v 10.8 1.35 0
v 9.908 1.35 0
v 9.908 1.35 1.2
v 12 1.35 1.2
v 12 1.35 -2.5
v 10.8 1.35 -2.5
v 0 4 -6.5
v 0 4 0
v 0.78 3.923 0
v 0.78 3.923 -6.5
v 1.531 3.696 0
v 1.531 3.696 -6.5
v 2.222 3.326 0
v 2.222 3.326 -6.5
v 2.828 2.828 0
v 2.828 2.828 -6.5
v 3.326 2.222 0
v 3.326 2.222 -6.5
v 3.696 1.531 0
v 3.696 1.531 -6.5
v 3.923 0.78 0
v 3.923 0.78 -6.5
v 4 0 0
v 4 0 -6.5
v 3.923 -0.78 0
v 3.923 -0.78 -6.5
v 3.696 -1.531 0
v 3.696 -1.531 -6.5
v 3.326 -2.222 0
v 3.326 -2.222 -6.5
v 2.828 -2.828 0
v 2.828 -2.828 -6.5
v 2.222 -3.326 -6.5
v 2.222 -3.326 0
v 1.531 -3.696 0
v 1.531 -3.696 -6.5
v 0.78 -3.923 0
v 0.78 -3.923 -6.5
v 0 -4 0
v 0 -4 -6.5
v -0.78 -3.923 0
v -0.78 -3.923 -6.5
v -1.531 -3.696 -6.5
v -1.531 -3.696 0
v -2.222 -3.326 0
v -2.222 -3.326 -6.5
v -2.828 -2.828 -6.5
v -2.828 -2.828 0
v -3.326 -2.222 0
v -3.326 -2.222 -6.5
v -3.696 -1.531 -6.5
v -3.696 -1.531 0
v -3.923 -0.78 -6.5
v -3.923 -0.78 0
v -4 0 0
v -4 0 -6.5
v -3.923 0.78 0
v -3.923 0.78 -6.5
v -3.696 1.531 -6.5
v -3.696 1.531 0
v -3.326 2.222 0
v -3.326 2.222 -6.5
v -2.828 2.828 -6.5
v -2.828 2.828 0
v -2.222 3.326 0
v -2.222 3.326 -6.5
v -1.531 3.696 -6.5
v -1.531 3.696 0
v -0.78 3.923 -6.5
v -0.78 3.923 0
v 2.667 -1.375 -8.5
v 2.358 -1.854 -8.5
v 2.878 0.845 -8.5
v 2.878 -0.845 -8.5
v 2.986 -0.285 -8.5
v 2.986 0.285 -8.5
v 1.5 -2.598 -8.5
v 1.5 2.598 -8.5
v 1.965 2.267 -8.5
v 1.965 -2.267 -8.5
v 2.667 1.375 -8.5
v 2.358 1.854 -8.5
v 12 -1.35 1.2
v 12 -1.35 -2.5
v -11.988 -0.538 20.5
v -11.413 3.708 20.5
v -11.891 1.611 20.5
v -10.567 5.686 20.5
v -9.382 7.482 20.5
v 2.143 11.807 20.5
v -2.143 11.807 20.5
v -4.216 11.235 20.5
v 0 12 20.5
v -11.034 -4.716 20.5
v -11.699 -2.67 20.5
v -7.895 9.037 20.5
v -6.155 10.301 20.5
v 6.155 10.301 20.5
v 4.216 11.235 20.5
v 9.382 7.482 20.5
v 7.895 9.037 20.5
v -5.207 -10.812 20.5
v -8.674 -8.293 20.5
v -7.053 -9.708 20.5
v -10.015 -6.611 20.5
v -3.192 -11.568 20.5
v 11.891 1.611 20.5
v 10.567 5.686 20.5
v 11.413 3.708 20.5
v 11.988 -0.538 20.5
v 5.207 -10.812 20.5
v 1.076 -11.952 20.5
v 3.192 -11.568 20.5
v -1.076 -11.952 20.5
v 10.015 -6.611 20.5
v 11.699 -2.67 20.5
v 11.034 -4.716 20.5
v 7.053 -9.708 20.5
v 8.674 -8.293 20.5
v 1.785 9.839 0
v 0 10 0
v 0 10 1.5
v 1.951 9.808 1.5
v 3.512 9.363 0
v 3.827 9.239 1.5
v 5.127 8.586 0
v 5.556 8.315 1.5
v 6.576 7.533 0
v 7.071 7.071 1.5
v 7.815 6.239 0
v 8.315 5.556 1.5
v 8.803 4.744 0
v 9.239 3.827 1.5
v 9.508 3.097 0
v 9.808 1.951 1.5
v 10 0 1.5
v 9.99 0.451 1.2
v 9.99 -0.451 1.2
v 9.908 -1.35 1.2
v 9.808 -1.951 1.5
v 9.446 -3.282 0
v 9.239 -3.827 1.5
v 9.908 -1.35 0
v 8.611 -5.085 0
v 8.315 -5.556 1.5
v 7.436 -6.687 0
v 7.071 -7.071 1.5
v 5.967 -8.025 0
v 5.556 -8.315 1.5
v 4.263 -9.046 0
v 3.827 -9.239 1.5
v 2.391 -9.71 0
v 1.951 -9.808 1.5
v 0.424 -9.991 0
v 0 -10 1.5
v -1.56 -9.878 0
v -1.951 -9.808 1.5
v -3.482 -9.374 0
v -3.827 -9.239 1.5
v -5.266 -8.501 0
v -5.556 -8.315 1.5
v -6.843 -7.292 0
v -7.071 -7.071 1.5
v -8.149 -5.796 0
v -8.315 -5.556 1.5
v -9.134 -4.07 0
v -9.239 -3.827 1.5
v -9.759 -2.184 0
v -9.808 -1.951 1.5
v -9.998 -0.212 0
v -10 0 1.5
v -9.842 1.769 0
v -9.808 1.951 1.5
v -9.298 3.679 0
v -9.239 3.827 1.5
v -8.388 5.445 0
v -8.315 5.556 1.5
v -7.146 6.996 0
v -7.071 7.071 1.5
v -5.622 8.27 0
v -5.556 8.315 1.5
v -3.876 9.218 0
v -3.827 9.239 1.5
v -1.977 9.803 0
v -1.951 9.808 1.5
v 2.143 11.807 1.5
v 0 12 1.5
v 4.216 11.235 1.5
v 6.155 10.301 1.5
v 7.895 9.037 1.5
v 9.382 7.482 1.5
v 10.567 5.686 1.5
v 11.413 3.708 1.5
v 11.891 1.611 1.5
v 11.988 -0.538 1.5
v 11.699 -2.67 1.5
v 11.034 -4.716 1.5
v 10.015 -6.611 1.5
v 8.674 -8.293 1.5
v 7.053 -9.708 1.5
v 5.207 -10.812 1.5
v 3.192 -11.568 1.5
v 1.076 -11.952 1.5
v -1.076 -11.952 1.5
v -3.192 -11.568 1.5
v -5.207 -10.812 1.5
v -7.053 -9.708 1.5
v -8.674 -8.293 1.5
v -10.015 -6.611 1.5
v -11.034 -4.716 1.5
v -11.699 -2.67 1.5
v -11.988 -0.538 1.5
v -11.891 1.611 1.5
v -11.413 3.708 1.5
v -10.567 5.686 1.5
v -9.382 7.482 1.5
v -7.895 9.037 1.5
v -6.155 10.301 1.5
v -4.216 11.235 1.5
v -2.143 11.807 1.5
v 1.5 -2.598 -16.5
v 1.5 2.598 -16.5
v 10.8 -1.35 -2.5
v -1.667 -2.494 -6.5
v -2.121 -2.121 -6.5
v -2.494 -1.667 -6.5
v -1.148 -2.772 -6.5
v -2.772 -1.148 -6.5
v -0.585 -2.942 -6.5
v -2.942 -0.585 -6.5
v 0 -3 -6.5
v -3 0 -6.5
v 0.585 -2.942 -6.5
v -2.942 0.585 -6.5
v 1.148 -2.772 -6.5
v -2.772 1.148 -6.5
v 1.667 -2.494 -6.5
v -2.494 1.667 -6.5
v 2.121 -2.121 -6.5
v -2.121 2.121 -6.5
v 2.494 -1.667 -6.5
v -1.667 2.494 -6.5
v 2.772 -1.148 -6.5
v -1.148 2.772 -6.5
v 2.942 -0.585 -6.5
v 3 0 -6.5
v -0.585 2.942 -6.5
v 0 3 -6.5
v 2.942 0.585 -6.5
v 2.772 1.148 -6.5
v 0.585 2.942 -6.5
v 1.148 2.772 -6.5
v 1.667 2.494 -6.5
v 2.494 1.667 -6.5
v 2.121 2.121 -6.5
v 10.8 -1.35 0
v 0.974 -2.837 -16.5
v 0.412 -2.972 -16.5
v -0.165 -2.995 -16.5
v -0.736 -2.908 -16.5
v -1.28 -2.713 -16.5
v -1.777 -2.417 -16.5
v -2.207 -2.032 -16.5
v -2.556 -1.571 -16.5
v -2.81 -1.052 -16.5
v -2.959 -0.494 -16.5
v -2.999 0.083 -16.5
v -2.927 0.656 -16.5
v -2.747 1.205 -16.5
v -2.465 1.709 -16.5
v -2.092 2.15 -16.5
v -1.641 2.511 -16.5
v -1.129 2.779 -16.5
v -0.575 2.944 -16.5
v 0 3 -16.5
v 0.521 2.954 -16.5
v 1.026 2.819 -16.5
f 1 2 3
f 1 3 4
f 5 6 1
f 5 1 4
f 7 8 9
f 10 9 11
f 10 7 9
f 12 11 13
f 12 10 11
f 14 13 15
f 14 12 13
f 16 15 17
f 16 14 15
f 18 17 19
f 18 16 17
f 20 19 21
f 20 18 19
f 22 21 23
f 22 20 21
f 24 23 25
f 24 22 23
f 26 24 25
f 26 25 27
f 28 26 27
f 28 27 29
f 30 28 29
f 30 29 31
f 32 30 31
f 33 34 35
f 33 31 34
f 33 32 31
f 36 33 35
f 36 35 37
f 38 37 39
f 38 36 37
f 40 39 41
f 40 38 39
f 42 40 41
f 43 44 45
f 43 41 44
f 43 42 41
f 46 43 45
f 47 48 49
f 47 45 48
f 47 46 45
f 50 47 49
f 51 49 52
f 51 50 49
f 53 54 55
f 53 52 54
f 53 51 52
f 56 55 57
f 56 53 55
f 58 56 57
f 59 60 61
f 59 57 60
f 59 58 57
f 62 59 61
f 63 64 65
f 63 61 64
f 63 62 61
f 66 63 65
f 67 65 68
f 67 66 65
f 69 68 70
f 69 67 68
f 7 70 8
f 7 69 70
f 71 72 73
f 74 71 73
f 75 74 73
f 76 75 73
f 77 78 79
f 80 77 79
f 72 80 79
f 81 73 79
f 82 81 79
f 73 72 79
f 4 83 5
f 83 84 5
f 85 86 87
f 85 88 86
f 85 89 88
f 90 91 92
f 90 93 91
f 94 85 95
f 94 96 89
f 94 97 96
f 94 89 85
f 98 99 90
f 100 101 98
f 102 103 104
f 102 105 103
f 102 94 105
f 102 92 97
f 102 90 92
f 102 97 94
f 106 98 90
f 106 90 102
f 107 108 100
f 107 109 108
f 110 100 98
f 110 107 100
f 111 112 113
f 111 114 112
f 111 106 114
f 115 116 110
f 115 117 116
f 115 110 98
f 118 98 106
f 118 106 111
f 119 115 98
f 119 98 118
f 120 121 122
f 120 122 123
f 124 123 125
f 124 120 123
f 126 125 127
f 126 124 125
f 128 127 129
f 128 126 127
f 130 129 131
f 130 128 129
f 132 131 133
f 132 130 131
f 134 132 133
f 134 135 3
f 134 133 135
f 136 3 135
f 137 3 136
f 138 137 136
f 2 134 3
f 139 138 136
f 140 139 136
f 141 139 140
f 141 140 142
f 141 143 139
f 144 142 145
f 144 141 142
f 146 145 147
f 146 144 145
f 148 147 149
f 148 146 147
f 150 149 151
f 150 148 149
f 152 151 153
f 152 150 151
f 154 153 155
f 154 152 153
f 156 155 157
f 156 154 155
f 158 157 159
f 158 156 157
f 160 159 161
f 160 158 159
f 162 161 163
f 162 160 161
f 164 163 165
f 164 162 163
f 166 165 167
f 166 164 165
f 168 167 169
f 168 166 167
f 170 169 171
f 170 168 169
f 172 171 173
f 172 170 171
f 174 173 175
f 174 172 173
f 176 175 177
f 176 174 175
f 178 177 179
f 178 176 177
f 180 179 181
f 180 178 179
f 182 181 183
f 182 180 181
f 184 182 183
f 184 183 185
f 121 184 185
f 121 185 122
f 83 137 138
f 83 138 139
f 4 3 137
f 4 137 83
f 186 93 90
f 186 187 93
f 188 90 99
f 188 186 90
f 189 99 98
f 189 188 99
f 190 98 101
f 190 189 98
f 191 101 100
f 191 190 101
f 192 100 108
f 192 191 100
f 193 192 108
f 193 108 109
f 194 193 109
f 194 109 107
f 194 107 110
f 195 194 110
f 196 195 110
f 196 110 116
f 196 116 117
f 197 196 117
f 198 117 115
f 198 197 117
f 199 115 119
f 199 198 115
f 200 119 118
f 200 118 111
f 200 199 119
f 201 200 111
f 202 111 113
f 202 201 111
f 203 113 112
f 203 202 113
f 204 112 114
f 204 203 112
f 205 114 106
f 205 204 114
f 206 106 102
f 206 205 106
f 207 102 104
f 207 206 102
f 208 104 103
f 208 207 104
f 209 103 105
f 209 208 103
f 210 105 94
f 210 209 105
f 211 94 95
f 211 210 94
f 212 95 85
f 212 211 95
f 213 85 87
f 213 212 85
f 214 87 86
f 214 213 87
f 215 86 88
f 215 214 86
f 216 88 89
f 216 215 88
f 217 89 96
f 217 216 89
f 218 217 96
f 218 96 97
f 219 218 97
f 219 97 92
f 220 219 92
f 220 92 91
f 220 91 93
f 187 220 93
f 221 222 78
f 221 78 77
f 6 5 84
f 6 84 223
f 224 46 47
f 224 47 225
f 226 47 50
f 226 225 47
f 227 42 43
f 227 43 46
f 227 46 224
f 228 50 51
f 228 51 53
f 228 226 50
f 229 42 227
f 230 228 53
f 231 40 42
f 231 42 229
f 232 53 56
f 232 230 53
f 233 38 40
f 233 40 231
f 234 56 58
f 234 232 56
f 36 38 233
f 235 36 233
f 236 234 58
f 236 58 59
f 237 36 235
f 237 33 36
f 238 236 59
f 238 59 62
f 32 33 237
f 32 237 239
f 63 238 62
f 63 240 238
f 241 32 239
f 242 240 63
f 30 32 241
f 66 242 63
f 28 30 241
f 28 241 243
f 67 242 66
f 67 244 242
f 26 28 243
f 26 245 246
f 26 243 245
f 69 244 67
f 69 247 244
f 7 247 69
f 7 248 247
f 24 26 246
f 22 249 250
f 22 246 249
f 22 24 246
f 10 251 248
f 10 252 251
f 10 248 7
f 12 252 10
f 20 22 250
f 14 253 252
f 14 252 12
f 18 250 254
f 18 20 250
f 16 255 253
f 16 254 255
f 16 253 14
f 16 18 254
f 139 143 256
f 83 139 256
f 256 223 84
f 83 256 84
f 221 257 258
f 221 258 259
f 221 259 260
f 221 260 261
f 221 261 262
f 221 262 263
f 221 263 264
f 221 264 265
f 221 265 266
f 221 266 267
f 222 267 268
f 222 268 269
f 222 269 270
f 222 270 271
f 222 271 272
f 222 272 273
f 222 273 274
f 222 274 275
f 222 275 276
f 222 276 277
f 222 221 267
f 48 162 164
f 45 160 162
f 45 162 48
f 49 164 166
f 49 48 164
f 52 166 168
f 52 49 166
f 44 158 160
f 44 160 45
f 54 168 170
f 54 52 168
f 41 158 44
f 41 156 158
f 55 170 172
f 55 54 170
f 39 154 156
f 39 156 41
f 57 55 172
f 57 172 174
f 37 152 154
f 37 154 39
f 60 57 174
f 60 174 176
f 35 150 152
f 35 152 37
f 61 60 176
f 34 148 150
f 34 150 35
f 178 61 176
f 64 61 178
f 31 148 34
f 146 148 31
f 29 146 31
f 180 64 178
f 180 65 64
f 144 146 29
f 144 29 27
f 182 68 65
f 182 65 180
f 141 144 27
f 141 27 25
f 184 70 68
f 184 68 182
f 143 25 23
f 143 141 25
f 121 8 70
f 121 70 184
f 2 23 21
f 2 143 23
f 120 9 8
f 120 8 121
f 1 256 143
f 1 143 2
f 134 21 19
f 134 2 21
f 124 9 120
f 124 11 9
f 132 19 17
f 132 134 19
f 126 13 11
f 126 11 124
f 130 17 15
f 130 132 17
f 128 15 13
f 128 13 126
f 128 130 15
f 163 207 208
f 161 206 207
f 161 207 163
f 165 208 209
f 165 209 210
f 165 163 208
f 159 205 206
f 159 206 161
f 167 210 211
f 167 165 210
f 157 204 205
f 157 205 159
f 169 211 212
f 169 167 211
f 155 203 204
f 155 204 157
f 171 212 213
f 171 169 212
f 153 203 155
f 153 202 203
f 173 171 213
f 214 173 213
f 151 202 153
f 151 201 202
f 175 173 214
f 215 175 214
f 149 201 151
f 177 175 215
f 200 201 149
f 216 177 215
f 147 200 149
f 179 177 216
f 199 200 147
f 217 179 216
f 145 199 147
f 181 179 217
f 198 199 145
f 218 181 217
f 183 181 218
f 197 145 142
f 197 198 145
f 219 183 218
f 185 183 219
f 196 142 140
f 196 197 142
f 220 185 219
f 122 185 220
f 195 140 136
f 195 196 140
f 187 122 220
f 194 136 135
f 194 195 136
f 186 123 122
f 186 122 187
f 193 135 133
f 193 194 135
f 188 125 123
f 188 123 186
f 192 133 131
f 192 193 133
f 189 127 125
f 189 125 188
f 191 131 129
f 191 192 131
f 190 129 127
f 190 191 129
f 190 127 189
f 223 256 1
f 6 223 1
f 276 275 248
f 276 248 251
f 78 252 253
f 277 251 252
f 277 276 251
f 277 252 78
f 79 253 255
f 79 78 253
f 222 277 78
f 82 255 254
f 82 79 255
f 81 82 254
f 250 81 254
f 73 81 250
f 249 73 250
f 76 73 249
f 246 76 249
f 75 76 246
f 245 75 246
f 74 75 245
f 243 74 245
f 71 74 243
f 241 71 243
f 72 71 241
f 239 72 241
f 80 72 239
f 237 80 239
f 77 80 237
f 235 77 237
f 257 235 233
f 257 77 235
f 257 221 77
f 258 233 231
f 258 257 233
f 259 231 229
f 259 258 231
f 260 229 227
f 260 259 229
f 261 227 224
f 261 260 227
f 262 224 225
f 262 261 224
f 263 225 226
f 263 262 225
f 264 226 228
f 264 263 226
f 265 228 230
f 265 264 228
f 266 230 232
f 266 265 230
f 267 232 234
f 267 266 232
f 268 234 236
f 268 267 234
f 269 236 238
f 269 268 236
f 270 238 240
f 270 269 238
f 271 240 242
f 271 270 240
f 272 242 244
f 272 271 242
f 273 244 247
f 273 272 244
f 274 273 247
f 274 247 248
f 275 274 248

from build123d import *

# Parameters (mm, degrees)
SKETCH_2_W          = 1.2
SKETCH_2_H          = 2.7
EXTRUDE_1_DEPTH     = 2.5
SKETCH_3_W          = 12
SKETCH_3_H          = 2.7
EXTRUDE_2_DEPTH     = 1.2
CUT_EXTRUDE_1_DEPTH = 8


with BuildPart() as part:
    # Эскиз1 → Повернуть1 (revolve)
    with BuildSketch(Plane(origin=(0, 0, 0), x_dir=(0, 0, -1), z_dir=(1, 0, 0))):
        Polygon((-20.5, 0), (-20.5, 12), (-1.5, 12), (-1.5, 10), (0, 10), (0, 4), (6.5, 4), (6.5, 3), (16.5, 3), (16.5, 0), align=None)
    revolve(axis=Axis((0, 0, 20.5), (0, 0, -1)))



with BuildPart() as body_2:
    # Эскиз2 → Бобышка-Вытянуть1 (new body)
    with BuildSketch(Plane(origin=(0, 0, 0), x_dir=(-1, 0, 0), z_dir=(0, 0, -1))):
        with Locations((-11.4, 0)):
            Rectangle(SKETCH_2_W, SKETCH_2_H)
    extrude(amount=EXTRUDE_1_DEPTH)


with BuildPart() as part_1:
    add(part.part)

    add(body_2.part)  # Бобышка-Вытянуть2 merges body 2
    # Эскиз3 → Бобышка-Вытянуть2 (add)
    with BuildSketch(Plane.XY):
        with Locations((6, 0)):
            Rectangle(SKETCH_3_W, SKETCH_3_H)
    extrude(amount=EXTRUDE_2_DEPTH)

    # Эскиз4 → Вырез-Вытянуть1 (cut)
    with BuildSketch(Plane(origin=(0, 0, -16.5), x_dir=(-1, 0, 0), z_dir=(0, 0, -1))):
        with BuildLine():
            Line((-1.5, 2.598076211), (-1.5, -2.598076211))
            ThreePointArc((-1.5, -2.598076211), (-3, 0), (-1.5, 2.598076211))
        make_face()
    extrude(amount=-CUT_EXTRUDE_1_DEPTH, mode=Mode.SUBTRACT)


solid = part_1.part
